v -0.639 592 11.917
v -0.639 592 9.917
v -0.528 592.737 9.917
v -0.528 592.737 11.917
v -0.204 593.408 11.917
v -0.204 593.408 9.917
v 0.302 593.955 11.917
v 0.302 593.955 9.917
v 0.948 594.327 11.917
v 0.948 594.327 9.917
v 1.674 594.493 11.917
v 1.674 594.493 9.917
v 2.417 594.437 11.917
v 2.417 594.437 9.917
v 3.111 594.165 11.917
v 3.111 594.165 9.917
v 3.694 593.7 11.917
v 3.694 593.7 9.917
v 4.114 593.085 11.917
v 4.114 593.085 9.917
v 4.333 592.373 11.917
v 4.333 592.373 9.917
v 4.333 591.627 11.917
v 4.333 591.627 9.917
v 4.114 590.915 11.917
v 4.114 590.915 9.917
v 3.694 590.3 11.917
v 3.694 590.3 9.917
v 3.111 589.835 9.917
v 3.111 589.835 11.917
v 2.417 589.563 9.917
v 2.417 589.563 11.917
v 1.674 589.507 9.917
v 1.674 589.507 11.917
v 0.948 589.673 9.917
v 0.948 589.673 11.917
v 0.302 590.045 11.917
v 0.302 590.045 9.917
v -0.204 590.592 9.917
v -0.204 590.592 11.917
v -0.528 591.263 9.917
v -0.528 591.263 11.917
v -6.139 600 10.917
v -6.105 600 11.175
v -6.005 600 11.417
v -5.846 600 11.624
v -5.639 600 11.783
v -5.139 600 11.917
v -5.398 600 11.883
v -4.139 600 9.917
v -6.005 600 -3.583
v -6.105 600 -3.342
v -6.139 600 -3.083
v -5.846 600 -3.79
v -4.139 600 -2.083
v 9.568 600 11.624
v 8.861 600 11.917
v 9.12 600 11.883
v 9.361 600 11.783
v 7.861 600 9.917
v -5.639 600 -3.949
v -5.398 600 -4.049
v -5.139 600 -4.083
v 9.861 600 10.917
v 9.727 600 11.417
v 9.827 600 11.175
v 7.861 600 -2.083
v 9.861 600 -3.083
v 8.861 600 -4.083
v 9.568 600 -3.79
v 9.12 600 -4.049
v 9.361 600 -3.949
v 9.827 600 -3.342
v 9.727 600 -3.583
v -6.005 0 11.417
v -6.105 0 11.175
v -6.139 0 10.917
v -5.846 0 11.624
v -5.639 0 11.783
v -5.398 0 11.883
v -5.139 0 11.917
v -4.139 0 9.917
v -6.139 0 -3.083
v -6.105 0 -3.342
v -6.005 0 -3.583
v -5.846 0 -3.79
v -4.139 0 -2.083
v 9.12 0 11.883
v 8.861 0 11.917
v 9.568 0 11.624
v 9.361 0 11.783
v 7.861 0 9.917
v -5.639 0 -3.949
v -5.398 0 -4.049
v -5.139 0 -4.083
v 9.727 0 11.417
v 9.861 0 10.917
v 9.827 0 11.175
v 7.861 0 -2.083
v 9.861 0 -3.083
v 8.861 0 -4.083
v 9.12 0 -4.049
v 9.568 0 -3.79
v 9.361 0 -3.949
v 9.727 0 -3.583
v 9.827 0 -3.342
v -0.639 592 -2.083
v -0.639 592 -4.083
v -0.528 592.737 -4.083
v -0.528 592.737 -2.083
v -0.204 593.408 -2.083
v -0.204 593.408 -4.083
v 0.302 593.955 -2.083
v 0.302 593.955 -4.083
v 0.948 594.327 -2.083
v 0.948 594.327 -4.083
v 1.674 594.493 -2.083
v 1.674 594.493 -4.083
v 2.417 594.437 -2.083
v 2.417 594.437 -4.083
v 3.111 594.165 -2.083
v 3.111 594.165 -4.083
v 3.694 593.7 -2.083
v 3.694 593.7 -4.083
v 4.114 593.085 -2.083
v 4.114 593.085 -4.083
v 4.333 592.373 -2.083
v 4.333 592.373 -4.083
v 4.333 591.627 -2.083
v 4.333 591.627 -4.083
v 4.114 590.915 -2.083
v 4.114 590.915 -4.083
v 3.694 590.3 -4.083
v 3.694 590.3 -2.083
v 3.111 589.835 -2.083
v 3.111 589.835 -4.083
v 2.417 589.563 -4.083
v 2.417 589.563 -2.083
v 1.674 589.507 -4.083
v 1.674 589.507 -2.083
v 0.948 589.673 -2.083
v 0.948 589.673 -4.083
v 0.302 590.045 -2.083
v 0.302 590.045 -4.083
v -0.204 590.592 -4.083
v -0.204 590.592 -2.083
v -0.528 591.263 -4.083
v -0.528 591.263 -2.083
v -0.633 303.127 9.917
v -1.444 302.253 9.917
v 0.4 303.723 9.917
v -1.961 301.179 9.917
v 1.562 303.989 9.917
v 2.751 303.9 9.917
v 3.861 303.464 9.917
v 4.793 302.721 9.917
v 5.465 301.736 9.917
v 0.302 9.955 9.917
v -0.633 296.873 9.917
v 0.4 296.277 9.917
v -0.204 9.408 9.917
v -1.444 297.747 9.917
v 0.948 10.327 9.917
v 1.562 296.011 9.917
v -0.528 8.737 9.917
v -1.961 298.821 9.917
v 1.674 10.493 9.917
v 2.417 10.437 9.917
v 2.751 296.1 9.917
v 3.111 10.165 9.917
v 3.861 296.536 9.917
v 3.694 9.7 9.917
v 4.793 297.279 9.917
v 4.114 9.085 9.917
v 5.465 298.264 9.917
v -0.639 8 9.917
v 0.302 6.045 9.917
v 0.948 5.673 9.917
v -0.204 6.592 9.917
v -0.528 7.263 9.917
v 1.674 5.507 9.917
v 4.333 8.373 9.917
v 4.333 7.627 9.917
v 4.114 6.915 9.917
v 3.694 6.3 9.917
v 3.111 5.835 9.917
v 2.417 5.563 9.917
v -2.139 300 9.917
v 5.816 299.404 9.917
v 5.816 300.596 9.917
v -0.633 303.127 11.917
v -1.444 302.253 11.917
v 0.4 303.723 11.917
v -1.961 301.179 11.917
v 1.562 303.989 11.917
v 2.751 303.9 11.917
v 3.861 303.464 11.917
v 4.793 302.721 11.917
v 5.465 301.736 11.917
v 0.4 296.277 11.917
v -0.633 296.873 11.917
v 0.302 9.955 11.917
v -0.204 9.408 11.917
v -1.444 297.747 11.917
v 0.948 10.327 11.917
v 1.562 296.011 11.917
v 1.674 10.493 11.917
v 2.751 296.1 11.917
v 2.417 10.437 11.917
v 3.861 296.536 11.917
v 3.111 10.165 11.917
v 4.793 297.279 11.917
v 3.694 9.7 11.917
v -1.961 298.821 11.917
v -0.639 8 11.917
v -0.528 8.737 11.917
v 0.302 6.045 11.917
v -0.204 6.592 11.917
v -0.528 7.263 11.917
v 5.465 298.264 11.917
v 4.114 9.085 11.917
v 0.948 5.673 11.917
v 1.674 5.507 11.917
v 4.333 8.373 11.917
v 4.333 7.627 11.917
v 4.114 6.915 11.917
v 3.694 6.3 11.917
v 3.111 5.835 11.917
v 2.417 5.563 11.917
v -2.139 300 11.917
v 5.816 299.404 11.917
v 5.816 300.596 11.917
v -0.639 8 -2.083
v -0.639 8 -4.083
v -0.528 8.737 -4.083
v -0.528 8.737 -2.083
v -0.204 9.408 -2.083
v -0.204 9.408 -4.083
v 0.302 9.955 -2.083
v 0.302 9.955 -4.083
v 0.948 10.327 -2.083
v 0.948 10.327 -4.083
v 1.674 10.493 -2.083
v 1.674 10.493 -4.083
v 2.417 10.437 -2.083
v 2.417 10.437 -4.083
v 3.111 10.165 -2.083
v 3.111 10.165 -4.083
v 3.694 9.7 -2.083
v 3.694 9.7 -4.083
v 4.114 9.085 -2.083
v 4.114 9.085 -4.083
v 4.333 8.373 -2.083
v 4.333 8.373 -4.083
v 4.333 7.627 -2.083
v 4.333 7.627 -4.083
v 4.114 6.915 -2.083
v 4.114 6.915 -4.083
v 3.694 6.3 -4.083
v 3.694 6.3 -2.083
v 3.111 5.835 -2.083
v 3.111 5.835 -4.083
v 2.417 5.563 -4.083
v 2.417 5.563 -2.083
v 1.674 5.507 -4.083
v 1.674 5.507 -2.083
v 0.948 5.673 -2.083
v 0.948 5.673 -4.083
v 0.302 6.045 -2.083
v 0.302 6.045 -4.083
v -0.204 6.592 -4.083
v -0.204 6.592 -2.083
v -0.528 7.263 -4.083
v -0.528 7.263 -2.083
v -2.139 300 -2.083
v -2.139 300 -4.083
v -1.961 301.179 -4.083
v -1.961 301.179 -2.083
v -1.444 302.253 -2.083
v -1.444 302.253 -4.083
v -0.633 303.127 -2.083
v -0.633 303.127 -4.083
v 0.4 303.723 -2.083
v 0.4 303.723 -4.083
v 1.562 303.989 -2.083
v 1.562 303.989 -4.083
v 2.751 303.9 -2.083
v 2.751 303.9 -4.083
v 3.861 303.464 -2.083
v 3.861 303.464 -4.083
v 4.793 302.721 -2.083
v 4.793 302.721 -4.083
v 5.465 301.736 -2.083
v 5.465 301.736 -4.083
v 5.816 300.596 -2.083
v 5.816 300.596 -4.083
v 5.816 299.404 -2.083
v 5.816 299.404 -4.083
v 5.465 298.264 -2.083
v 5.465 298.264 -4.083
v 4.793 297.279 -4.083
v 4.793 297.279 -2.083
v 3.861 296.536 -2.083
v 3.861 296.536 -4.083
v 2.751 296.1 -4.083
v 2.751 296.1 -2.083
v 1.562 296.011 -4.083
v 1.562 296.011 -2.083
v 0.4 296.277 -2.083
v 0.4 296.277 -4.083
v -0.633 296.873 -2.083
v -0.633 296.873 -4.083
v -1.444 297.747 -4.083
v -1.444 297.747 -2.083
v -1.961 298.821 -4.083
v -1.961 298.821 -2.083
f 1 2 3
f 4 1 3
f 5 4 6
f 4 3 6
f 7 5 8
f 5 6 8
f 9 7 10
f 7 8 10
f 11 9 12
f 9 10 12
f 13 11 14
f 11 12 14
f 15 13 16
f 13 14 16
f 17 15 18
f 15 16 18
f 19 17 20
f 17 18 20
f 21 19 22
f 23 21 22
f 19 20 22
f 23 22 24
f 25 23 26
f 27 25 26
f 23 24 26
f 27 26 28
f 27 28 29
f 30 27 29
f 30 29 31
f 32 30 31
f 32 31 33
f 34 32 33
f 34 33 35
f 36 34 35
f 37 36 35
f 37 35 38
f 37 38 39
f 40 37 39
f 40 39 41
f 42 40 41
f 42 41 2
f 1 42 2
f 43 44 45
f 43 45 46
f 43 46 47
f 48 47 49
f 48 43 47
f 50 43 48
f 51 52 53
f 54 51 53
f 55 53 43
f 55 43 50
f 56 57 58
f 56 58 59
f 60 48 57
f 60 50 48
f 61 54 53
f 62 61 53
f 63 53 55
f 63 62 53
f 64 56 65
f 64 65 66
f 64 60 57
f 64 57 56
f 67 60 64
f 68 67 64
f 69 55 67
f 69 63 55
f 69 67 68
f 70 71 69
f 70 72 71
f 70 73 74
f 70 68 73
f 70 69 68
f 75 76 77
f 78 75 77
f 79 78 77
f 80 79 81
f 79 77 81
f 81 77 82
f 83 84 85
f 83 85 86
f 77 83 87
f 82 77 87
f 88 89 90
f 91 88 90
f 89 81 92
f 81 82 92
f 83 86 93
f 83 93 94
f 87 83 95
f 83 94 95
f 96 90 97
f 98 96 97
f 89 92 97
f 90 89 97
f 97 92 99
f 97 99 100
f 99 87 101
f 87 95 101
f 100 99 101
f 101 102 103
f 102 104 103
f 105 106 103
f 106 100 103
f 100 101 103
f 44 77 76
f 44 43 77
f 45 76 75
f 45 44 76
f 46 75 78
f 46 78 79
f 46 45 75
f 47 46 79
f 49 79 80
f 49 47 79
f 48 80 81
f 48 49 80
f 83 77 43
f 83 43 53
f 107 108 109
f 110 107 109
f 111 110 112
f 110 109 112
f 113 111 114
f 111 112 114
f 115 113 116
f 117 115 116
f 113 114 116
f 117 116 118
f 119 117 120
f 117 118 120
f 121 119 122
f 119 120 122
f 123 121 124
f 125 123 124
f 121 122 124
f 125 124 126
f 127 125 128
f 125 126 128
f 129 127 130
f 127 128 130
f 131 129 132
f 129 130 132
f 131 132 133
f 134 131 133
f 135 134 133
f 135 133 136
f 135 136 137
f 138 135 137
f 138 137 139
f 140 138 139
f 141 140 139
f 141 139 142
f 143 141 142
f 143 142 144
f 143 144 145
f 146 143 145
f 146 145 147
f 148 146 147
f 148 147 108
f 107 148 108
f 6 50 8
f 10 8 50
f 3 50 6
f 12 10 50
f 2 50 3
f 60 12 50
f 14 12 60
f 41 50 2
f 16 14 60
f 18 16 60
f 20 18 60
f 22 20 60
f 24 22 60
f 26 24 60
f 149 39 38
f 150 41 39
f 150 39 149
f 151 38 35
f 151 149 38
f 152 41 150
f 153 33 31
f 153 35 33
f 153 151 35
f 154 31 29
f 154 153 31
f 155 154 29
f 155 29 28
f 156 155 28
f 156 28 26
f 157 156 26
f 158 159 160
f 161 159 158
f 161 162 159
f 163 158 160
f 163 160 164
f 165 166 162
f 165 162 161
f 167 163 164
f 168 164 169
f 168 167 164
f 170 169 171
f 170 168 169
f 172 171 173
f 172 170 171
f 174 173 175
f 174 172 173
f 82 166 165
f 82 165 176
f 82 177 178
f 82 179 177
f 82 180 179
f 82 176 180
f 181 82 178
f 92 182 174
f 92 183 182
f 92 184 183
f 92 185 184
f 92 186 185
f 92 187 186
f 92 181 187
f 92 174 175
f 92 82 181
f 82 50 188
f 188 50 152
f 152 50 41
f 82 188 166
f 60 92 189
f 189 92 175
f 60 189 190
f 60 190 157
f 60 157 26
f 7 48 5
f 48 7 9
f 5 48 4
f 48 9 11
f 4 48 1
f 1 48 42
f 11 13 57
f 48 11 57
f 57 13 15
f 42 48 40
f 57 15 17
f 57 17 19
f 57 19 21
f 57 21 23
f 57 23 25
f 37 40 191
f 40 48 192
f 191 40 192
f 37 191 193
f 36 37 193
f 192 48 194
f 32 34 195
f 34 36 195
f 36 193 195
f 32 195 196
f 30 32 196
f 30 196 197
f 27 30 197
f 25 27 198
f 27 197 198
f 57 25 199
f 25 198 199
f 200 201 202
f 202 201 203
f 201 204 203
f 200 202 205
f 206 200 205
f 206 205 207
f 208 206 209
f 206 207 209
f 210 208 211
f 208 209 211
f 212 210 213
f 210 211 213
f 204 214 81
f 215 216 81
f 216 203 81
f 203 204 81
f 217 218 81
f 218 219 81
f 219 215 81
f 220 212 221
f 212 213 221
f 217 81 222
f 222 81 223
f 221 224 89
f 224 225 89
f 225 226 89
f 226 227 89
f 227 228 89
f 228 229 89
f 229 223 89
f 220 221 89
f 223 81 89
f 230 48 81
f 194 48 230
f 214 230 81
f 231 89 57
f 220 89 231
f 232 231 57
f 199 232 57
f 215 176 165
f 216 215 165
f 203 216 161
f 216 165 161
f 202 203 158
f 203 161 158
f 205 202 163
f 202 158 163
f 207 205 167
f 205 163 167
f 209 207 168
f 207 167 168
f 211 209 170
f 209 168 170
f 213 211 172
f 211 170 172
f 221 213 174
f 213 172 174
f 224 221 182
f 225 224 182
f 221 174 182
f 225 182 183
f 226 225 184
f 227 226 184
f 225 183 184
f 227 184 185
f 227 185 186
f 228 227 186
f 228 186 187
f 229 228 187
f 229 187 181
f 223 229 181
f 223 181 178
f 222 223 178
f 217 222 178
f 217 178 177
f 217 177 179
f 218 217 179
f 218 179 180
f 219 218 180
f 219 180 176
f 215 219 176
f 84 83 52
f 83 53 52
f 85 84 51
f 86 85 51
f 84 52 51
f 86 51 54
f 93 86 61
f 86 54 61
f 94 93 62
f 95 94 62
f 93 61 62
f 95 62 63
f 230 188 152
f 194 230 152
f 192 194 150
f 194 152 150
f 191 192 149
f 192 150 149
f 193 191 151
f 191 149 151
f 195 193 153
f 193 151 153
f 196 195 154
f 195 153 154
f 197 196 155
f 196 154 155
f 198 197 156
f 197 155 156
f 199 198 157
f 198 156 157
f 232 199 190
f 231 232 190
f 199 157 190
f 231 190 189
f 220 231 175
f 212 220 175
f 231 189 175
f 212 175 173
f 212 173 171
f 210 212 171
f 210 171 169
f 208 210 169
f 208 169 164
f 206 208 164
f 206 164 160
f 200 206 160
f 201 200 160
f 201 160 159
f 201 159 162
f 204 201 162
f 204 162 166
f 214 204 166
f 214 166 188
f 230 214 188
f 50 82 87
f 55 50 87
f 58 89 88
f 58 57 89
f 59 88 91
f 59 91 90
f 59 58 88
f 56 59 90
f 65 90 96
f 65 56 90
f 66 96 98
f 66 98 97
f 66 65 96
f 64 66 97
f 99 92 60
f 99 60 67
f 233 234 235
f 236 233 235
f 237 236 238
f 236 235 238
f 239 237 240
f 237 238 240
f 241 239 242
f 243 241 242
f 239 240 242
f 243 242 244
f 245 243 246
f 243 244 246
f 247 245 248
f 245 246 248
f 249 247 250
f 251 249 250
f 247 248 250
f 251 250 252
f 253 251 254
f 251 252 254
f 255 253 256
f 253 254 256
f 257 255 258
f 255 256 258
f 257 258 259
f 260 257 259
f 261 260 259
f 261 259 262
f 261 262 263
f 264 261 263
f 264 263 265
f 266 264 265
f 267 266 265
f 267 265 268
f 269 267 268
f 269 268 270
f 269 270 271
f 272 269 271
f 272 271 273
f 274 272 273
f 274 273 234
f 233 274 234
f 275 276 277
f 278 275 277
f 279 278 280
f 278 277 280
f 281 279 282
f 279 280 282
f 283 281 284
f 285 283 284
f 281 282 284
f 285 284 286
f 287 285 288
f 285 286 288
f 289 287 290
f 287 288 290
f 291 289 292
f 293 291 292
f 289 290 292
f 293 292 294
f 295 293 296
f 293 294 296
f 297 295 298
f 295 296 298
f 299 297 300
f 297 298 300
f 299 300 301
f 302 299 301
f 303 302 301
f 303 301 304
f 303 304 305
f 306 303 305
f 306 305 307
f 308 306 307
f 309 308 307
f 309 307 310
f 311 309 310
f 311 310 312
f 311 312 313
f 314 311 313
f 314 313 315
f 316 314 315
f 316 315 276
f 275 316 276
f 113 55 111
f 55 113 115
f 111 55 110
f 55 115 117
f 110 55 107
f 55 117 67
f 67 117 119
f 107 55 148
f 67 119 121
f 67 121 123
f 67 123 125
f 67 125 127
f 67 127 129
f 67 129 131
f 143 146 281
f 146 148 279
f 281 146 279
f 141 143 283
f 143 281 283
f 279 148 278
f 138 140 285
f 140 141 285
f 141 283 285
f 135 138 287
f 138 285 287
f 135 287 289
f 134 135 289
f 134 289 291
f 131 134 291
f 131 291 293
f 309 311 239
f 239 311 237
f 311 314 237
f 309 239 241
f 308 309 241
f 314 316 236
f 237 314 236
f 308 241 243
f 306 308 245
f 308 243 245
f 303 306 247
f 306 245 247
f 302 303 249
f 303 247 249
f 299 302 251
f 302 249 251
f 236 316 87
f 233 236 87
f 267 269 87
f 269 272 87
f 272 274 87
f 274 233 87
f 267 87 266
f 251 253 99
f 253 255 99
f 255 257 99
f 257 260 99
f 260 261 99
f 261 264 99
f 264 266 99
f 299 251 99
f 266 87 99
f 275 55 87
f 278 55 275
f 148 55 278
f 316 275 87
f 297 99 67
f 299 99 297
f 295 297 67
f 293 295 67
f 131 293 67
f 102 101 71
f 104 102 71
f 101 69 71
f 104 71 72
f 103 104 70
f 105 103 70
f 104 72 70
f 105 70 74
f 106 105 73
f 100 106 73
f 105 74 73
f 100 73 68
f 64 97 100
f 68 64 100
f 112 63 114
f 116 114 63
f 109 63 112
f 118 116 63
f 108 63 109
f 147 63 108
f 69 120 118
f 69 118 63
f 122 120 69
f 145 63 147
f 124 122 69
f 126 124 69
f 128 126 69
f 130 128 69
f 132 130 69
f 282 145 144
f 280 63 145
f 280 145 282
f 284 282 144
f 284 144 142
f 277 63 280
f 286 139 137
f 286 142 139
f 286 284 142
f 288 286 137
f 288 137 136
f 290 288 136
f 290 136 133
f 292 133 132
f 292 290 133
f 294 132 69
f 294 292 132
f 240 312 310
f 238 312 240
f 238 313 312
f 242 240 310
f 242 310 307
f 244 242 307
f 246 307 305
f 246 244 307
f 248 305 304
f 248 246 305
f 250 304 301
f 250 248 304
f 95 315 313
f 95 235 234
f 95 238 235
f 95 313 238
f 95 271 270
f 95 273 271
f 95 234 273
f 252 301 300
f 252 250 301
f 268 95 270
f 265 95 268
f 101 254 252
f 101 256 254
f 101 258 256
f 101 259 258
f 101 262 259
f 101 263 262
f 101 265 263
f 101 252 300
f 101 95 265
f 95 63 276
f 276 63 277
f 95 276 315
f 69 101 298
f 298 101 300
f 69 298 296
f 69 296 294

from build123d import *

# Parameters (mm, degrees)
SKETCH1_W           = 16
SKETCH1_H           = 16
SKETCH1_W_2         = 12
SKETCH1_H_2         = 12
BOSS_EXTRUDE1_DEPTH = 600
FILLET1_R           = 1
SKETCH2_R           = 2.5
SKETCH2_R_2         = 4
CUT_EXTRUDE1_DEPTH  = 16


with BuildPart() as part:
    # Sketch1 → Boss-Extrude1 (new body)
    with BuildSketch(Plane(origin=(0, 0, 0), x_dir=(1, 0, 0), z_dir=(0, 1, 0))):
        with Locations((1.861111111, -3.916666667)):
            Rectangle(SKETCH1_W, SKETCH1_H)
        with Locations((1.861111111, -3.916666667)):
            Rectangle(SKETCH1_W_2, SKETCH1_H_2, mode=Mode.SUBTRACT)
    extrude(amount=BOSS_EXTRUDE1_DEPTH)

    # Fillet1
    fillet1_edges = [part.edges().sort_by_distance(p)[0] for p in [
        (-6.138888889, 300, -4.083333333),
        (9.861111111, 300, -4.083333333),
        (9.861111111, 300, 11.916666667),
        (-6.138888889, 300, 11.916666667),
    ]]
    fillet(fillet1_edges, radius=FILLET1_R)

    # Sketch2 → Cut-Extrude1 (cut)
    with BuildSketch(Plane(origin=(0, 0, -4.083333333), x_dir=(-1, 0, 0), z_dir=(0, 0, -1))):
        with Locations((-1.861111111, 8)):
            Circle(SKETCH2_R)
        with Locations((-1.861111111, 592)):
            Circle(SKETCH2_R)
        with Locations((-1.861111111, 300)):
            Circle(SKETCH2_R_2)
    extrude(amount=-CUT_EXTRUDE1_DEPTH, mode=Mode.SUBTRACT)


solid = part.part
